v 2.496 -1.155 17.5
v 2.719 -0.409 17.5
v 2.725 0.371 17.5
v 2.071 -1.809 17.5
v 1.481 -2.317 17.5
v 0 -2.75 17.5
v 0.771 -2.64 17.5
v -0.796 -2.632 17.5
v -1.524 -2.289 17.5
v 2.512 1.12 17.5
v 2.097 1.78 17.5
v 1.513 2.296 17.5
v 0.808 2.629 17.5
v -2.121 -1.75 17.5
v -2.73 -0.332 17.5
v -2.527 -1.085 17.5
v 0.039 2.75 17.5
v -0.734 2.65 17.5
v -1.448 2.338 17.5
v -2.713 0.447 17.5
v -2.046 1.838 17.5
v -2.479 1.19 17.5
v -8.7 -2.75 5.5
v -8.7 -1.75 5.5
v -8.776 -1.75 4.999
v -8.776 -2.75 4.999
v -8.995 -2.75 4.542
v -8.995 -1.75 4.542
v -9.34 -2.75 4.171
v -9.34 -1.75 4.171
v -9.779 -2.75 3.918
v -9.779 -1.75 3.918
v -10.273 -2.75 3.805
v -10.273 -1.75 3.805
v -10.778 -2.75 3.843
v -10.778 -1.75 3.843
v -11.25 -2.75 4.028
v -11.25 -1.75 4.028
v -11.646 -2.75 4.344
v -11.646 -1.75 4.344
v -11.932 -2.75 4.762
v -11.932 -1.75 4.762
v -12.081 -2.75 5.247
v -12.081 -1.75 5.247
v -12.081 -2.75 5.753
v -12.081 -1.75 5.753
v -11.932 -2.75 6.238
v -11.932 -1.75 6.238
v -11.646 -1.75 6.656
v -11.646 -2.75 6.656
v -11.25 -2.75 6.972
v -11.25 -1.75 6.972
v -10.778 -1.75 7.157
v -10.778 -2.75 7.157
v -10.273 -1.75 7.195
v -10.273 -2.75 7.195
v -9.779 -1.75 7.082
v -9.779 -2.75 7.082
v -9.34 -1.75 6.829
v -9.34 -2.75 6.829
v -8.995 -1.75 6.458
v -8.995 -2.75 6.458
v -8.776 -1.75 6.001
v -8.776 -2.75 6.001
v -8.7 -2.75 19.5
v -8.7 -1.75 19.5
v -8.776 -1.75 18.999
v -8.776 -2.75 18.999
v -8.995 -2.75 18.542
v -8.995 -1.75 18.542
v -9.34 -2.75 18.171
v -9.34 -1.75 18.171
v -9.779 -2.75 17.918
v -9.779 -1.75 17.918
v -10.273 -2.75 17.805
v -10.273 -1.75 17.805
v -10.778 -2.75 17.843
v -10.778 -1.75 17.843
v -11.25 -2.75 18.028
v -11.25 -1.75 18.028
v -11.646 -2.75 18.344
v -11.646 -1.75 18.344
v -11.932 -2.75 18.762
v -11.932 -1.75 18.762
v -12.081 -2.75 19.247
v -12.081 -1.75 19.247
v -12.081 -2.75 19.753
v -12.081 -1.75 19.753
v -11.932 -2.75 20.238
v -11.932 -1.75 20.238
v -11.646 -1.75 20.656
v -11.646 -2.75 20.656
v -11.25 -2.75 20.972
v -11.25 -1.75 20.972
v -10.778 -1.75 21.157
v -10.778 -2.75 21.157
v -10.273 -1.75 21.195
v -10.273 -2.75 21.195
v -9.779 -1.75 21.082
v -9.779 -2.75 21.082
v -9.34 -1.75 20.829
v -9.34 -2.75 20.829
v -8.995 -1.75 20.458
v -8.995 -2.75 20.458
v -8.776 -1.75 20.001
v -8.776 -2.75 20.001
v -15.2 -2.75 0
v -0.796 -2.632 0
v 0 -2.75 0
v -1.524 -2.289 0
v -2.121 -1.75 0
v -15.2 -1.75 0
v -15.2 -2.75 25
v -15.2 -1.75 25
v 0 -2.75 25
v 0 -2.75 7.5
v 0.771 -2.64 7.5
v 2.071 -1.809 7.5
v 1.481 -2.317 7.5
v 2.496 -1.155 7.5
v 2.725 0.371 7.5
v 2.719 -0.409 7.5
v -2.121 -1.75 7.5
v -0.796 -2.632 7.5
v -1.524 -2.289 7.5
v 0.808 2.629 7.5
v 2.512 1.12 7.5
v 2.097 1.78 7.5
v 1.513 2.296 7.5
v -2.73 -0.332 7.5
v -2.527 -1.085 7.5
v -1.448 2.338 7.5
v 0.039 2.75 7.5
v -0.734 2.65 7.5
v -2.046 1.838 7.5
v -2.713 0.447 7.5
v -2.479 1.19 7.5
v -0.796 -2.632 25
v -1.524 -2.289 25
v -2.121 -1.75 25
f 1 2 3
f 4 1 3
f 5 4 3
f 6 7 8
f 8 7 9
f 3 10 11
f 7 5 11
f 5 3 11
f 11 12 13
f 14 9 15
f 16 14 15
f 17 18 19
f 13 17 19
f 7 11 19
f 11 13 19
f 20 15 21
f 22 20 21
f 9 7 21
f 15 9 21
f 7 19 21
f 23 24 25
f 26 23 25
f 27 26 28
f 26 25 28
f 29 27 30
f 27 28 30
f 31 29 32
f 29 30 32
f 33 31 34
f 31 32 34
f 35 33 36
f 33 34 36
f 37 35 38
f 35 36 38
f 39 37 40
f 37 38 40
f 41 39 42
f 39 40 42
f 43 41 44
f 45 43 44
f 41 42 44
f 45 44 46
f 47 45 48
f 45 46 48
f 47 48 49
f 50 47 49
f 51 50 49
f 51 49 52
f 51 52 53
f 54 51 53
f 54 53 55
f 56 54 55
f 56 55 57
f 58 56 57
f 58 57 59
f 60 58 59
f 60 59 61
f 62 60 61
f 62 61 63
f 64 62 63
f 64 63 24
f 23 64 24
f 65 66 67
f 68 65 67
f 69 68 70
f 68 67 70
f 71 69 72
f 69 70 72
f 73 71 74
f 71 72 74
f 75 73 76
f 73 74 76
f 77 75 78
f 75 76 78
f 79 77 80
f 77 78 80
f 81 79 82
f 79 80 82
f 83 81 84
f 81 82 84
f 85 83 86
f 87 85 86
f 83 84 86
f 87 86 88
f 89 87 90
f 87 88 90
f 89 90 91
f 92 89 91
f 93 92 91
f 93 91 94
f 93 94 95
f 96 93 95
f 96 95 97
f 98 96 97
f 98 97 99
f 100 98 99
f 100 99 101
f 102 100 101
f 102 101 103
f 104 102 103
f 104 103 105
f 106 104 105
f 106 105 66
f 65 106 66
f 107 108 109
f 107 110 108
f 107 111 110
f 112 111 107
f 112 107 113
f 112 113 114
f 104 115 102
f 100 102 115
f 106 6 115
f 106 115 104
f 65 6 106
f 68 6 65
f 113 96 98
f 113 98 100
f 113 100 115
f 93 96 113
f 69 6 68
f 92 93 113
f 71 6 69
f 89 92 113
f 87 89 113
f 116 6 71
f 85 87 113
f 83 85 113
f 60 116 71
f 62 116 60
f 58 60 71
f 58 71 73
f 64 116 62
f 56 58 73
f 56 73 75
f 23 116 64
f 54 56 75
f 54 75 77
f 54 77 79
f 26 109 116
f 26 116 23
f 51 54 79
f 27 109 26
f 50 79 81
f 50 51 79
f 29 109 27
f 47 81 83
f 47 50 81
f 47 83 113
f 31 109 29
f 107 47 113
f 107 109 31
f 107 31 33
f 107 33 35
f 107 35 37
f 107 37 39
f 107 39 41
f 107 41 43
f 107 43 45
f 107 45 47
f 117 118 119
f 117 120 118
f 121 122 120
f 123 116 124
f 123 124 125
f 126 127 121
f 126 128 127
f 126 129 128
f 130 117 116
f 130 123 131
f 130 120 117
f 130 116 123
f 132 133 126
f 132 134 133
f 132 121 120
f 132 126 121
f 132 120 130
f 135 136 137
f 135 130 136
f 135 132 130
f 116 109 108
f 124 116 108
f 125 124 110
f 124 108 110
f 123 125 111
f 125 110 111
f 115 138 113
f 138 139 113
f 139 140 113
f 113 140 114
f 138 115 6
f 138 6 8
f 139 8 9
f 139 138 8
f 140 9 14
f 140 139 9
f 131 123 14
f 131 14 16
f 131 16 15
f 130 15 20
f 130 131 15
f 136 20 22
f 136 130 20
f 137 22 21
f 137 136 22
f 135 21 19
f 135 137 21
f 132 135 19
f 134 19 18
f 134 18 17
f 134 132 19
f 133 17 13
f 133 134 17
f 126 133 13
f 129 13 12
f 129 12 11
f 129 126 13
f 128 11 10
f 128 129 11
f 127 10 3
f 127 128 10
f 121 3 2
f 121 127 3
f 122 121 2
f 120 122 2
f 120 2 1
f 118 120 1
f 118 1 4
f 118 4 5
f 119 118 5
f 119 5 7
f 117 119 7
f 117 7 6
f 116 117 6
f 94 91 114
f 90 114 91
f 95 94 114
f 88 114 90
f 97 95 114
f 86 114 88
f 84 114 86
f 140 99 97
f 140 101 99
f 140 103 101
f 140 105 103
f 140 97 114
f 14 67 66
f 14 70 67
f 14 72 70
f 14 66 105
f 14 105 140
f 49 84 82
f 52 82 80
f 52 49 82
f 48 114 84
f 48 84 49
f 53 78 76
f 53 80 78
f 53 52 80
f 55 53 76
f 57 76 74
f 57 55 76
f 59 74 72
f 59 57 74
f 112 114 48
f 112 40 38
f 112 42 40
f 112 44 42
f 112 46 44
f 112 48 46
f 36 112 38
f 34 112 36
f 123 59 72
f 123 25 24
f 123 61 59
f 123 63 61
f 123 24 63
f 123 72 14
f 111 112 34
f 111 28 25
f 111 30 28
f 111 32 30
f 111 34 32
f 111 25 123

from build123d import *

# Parameters (mm, degrees)
EXTRUDE_1_DEPTH     = 25
SKETCH_2_R          = 1.7
CUT_EXTRUDE_1_DEPTH = 25
SKETCH_3_R          = 2.75
CUT_EXTRUDE_2_DEPTH = 7.5
CUT_EXTRUDE_START   = -25
SKETCH_3_2_R        = 2.75
CUT_EXTRUDE_3_DEPTH = 7.5


with BuildPart() as part:
    # 草图1 → 凸台-拉伸1 (new body)
    with BuildSketch(Plane.XY):
        with BuildLine():
            Line((0, -2.75), (-15.2, -2.75))
            Line((-15.2, -2.75), (-15.2, -1.75))
            Line((-15.2, -1.75), (-2.121320344, -1.75))
            ThreePointArc((-2.121320344, -1.75), (1.17260394, 2.487468593), (0, -2.75))
        make_face()
    extrude(amount=EXTRUDE_1_DEPTH)

    # 草图2 → 切除-拉伸1 (cut)
    with BuildSketch(Plane(origin=(0, -1.75, 0), x_dir=(1, 0, 0), z_dir=(0, 1, 0))):
        with Locations((-10.4, -5.5)):
            Circle(SKETCH_2_R)
        with Locations((-10.4, -19.5)):
            Circle(SKETCH_2_R)
    extrude(amount=-CUT_EXTRUDE_1_DEPTH, mode=Mode.SUBTRACT)

    # 草图3 → 切除-拉伸2 (cut)
    with BuildSketch(Plane(origin=(0, 0, 0), x_dir=(-1, 0, 0), z_dir=(0, 0, -1))):
        Circle(SKETCH_3_R)
    extrude(amount=-CUT_EXTRUDE_2_DEPTH, mode=Mode.SUBTRACT)

    # 草图3<2> → 切除-拉伸3 (cut)
    with BuildSketch(Plane(origin=(0, 0, 0), x_dir=(-1, 0, 0), z_dir=(0, 0, -1)).offset(CUT_EXTRUDE_START)):
        Circle(SKETCH_3_2_R)
    extrude(amount=CUT_EXTRUDE_3_DEPTH, mode=Mode.SUBTRACT)


solid = part.part
